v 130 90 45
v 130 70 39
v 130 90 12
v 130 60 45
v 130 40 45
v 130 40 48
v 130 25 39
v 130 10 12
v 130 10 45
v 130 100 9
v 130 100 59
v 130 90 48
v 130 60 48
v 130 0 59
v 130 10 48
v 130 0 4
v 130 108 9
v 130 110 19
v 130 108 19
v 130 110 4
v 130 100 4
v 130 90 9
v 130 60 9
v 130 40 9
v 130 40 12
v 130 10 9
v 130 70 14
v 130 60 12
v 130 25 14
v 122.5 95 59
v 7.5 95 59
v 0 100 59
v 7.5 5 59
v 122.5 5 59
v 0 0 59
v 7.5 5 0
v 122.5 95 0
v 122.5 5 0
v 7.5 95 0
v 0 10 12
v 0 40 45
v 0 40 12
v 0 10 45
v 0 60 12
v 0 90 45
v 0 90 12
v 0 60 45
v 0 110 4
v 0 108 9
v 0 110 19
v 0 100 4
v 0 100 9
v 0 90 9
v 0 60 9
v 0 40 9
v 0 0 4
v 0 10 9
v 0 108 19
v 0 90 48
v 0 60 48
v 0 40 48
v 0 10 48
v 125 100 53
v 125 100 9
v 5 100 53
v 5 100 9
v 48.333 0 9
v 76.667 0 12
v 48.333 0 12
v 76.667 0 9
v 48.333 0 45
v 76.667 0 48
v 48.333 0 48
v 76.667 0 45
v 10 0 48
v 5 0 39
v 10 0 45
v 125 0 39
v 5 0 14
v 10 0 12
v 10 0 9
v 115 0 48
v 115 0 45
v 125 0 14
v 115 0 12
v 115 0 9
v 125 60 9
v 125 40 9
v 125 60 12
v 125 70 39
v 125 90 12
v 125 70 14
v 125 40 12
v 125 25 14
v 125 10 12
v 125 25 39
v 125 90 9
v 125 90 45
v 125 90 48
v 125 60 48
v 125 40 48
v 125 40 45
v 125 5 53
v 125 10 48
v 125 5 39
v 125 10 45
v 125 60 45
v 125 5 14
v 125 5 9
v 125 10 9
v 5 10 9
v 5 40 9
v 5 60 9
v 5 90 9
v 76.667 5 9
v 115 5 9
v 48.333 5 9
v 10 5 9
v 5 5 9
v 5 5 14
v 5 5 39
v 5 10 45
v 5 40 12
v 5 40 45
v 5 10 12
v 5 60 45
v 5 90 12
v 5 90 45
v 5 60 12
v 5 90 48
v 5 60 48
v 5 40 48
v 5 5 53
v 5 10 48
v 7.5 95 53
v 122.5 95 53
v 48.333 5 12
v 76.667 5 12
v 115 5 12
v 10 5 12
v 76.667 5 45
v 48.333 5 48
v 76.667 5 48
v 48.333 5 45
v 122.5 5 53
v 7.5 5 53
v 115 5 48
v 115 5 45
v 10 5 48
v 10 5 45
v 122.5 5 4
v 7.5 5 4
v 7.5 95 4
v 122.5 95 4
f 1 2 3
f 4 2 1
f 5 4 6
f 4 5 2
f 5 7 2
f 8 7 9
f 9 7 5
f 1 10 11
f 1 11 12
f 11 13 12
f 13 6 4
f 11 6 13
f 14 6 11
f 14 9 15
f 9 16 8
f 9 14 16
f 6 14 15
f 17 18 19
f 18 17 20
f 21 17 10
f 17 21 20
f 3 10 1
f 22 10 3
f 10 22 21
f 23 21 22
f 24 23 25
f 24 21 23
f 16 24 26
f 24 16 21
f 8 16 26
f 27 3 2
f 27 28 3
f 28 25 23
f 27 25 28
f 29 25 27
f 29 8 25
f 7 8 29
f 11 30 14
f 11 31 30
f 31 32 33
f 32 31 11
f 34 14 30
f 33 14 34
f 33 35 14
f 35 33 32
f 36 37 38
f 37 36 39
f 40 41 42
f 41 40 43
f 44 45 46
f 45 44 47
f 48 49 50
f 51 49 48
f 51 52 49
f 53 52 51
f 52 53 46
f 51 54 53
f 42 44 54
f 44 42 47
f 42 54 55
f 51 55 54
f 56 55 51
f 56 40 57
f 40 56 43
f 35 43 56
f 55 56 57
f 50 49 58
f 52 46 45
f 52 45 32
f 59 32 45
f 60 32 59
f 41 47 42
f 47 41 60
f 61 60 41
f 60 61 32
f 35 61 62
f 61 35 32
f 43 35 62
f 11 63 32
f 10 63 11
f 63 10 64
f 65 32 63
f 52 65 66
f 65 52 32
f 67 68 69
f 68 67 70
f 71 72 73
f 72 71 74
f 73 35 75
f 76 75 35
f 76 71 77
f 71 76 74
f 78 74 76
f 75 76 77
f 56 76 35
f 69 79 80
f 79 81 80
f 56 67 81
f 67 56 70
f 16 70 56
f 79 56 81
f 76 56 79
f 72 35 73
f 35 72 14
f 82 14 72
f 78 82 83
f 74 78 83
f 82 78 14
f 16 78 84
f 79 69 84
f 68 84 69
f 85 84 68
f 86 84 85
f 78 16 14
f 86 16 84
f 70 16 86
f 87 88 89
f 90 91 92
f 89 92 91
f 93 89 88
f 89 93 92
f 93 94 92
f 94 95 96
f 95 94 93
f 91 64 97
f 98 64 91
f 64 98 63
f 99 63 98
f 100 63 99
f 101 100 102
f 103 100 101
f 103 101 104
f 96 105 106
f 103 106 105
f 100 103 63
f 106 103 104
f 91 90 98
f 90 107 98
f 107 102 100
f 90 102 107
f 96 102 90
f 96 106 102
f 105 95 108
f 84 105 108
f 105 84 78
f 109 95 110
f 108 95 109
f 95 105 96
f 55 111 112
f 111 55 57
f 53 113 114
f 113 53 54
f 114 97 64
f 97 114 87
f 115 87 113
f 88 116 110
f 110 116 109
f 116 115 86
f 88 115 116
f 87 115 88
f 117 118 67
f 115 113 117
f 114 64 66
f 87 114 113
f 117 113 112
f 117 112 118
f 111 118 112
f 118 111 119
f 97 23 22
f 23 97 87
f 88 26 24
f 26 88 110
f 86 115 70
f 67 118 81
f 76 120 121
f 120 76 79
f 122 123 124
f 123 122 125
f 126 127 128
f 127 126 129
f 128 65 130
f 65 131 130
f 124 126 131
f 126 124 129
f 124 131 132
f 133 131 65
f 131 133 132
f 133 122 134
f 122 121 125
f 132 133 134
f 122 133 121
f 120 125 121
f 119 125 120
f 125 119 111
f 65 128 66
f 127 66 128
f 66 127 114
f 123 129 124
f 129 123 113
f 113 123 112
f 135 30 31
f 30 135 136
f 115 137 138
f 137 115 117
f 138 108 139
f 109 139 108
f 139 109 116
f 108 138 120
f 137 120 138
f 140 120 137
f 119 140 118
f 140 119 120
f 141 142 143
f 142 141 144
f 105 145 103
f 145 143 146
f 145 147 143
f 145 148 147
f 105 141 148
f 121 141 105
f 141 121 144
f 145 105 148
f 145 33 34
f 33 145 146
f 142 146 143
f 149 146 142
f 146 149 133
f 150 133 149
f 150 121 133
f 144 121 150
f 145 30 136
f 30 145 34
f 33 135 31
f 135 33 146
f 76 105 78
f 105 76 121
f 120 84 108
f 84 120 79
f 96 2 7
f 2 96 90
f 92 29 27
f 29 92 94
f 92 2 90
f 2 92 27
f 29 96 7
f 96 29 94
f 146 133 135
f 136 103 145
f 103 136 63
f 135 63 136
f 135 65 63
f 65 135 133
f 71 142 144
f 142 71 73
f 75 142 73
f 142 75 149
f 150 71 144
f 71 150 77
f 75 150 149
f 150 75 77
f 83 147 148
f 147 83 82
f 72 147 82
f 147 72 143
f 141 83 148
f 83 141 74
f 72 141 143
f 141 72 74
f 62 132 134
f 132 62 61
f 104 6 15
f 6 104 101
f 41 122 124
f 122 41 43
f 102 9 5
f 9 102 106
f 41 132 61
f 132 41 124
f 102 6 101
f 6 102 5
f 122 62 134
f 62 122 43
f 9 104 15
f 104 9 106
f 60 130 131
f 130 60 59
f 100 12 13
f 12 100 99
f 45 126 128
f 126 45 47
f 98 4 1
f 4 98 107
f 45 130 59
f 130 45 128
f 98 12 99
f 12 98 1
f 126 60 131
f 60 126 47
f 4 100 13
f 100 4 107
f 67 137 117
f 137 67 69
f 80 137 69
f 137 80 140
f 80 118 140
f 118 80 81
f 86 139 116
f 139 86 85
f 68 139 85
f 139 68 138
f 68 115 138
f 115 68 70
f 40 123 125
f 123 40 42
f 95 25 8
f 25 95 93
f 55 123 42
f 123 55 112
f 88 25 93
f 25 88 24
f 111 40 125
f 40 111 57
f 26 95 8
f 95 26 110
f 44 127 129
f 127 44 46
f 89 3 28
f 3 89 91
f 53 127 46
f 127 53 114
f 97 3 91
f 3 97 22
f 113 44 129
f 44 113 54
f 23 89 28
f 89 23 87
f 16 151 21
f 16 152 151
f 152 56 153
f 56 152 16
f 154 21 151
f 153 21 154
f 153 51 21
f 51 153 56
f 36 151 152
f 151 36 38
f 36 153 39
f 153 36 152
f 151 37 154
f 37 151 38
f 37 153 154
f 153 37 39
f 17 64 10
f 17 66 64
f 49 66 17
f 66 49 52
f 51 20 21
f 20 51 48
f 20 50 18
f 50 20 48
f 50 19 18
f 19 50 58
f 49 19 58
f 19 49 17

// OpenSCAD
// file: hEX-hAP-Vars.scad
InnerW=115;
InnerD=90;
LipH=4;
Wall=5;
TabX=20;

DW=Wall*2;
TW=Wall*3;
OuterW=InnerW+DW;
OuterD=InnerD+DW;
Buff=1;
DB=Buff*2;
BackStopWall=2;
// main file
include <hEX-hAP-Vars.scad>;

InnerH=35;
InnerSW=120;
OuterSW=InnerSW+DW;
Front=25;
DevFeet=5;
SideCutH=25;
SideCutD=45;
SideCutPosD=25;
SideCutPosH=5;
VentH=3;

BoxFloor=LipH+Wall;
OuterH=LipH+InnerH+DW+DW;
TopVentH=BoxFloor+InnerH+Buff;
BottomVentH=BoxFloor;
LipXwidth=InnerSW-InnerW;
ExtraBack=8;


difference()
{
  cube([OuterSW,OuterD,OuterH]);
  //Main inner Cut
  translate([Wall,Wall,BoxFloor]) cube([InnerSW,InnerD,InnerH]); 
  //top Cut
  translate([LipXwidth+(Wall/2),Wall,BoxFloor]) cube([InnerW,InnerD,OuterH]); 

  //Front cut
  translate([Wall,-Buff,BoxFloor+DevFeet]) cube([InnerSW,DW,Front]);
  //Side Cut
  translate([InnerSW+Wall-Buff,SideCutPosD,BoxFloor+SideCutPosH]) cube([Wall+DB,SideCutD,SideCutH]); 
  //Back Cut
  translate([Wall,Wall,BoxFloor]) cube([InnerSW,OuterD,OuterH-TW]);

  
  // Top vents  
  translate([DW,-Buff,TopVentH]) cube([InnerW/3,OuterD+DB,VentH]);
  translate([((InnerW/3)*2),-Buff,TopVentH]) cube([InnerW/3,OuterD+DB,VentH]);
  translate([-Buff,DW,TopVentH]) cube([OuterSW+DB,InnerD/3,VentH]);
  translate([-Buff,((InnerD/3)*2),TopVentH]) cube([OuterSW+DB,InnerD/3,VentH]);
  
  // Bottom vents  
  translate([DW,-Buff,BottomVentH]) cube([InnerW/3,OuterD+DB,VentH]);
  translate([((InnerW/3)*2),-Buff,BottomVentH]) cube([InnerW/3,OuterD+DB,VentH]);
  translate([-Buff,DW,BottomVentH]) cube([OuterSW+DB,InnerD/3,VentH]);
  translate([-Buff,((InnerD/3)*2),BottomVentH]) cube([OuterSW+DB,InnerD/3,VentH]);
  
  //Stacking lip
  translate([-Buff,-Buff,-Buff]) cube([OuterSW+DB+Buff,Wall+Buff,LipH+Buff]);
  translate([-Buff,-Buff,-Buff]) cube([(LipXwidth/2)+Wall+Buff,OuterD+DB,LipH+Buff]);
  translate([InnerW+(LipXwidth/2)+Wall,-Buff,-Buff]) cube([LipXwidth+Wall,OuterD+Buff,LipH+Buff]);
  translate([-Buff,OuterD-Wall,-Buff]) cube([OuterSW+DB+Buff,Wall+DB+Buff,LipH+Buff]);
}
translate([0,OuterD,LipH]) cube([OuterSW,BackStopWall+ExtraBack,Wall]);
translate([0,OuterD+ExtraBack,BoxFloor]) cube([OuterSW,BackStopWall,DW]);
